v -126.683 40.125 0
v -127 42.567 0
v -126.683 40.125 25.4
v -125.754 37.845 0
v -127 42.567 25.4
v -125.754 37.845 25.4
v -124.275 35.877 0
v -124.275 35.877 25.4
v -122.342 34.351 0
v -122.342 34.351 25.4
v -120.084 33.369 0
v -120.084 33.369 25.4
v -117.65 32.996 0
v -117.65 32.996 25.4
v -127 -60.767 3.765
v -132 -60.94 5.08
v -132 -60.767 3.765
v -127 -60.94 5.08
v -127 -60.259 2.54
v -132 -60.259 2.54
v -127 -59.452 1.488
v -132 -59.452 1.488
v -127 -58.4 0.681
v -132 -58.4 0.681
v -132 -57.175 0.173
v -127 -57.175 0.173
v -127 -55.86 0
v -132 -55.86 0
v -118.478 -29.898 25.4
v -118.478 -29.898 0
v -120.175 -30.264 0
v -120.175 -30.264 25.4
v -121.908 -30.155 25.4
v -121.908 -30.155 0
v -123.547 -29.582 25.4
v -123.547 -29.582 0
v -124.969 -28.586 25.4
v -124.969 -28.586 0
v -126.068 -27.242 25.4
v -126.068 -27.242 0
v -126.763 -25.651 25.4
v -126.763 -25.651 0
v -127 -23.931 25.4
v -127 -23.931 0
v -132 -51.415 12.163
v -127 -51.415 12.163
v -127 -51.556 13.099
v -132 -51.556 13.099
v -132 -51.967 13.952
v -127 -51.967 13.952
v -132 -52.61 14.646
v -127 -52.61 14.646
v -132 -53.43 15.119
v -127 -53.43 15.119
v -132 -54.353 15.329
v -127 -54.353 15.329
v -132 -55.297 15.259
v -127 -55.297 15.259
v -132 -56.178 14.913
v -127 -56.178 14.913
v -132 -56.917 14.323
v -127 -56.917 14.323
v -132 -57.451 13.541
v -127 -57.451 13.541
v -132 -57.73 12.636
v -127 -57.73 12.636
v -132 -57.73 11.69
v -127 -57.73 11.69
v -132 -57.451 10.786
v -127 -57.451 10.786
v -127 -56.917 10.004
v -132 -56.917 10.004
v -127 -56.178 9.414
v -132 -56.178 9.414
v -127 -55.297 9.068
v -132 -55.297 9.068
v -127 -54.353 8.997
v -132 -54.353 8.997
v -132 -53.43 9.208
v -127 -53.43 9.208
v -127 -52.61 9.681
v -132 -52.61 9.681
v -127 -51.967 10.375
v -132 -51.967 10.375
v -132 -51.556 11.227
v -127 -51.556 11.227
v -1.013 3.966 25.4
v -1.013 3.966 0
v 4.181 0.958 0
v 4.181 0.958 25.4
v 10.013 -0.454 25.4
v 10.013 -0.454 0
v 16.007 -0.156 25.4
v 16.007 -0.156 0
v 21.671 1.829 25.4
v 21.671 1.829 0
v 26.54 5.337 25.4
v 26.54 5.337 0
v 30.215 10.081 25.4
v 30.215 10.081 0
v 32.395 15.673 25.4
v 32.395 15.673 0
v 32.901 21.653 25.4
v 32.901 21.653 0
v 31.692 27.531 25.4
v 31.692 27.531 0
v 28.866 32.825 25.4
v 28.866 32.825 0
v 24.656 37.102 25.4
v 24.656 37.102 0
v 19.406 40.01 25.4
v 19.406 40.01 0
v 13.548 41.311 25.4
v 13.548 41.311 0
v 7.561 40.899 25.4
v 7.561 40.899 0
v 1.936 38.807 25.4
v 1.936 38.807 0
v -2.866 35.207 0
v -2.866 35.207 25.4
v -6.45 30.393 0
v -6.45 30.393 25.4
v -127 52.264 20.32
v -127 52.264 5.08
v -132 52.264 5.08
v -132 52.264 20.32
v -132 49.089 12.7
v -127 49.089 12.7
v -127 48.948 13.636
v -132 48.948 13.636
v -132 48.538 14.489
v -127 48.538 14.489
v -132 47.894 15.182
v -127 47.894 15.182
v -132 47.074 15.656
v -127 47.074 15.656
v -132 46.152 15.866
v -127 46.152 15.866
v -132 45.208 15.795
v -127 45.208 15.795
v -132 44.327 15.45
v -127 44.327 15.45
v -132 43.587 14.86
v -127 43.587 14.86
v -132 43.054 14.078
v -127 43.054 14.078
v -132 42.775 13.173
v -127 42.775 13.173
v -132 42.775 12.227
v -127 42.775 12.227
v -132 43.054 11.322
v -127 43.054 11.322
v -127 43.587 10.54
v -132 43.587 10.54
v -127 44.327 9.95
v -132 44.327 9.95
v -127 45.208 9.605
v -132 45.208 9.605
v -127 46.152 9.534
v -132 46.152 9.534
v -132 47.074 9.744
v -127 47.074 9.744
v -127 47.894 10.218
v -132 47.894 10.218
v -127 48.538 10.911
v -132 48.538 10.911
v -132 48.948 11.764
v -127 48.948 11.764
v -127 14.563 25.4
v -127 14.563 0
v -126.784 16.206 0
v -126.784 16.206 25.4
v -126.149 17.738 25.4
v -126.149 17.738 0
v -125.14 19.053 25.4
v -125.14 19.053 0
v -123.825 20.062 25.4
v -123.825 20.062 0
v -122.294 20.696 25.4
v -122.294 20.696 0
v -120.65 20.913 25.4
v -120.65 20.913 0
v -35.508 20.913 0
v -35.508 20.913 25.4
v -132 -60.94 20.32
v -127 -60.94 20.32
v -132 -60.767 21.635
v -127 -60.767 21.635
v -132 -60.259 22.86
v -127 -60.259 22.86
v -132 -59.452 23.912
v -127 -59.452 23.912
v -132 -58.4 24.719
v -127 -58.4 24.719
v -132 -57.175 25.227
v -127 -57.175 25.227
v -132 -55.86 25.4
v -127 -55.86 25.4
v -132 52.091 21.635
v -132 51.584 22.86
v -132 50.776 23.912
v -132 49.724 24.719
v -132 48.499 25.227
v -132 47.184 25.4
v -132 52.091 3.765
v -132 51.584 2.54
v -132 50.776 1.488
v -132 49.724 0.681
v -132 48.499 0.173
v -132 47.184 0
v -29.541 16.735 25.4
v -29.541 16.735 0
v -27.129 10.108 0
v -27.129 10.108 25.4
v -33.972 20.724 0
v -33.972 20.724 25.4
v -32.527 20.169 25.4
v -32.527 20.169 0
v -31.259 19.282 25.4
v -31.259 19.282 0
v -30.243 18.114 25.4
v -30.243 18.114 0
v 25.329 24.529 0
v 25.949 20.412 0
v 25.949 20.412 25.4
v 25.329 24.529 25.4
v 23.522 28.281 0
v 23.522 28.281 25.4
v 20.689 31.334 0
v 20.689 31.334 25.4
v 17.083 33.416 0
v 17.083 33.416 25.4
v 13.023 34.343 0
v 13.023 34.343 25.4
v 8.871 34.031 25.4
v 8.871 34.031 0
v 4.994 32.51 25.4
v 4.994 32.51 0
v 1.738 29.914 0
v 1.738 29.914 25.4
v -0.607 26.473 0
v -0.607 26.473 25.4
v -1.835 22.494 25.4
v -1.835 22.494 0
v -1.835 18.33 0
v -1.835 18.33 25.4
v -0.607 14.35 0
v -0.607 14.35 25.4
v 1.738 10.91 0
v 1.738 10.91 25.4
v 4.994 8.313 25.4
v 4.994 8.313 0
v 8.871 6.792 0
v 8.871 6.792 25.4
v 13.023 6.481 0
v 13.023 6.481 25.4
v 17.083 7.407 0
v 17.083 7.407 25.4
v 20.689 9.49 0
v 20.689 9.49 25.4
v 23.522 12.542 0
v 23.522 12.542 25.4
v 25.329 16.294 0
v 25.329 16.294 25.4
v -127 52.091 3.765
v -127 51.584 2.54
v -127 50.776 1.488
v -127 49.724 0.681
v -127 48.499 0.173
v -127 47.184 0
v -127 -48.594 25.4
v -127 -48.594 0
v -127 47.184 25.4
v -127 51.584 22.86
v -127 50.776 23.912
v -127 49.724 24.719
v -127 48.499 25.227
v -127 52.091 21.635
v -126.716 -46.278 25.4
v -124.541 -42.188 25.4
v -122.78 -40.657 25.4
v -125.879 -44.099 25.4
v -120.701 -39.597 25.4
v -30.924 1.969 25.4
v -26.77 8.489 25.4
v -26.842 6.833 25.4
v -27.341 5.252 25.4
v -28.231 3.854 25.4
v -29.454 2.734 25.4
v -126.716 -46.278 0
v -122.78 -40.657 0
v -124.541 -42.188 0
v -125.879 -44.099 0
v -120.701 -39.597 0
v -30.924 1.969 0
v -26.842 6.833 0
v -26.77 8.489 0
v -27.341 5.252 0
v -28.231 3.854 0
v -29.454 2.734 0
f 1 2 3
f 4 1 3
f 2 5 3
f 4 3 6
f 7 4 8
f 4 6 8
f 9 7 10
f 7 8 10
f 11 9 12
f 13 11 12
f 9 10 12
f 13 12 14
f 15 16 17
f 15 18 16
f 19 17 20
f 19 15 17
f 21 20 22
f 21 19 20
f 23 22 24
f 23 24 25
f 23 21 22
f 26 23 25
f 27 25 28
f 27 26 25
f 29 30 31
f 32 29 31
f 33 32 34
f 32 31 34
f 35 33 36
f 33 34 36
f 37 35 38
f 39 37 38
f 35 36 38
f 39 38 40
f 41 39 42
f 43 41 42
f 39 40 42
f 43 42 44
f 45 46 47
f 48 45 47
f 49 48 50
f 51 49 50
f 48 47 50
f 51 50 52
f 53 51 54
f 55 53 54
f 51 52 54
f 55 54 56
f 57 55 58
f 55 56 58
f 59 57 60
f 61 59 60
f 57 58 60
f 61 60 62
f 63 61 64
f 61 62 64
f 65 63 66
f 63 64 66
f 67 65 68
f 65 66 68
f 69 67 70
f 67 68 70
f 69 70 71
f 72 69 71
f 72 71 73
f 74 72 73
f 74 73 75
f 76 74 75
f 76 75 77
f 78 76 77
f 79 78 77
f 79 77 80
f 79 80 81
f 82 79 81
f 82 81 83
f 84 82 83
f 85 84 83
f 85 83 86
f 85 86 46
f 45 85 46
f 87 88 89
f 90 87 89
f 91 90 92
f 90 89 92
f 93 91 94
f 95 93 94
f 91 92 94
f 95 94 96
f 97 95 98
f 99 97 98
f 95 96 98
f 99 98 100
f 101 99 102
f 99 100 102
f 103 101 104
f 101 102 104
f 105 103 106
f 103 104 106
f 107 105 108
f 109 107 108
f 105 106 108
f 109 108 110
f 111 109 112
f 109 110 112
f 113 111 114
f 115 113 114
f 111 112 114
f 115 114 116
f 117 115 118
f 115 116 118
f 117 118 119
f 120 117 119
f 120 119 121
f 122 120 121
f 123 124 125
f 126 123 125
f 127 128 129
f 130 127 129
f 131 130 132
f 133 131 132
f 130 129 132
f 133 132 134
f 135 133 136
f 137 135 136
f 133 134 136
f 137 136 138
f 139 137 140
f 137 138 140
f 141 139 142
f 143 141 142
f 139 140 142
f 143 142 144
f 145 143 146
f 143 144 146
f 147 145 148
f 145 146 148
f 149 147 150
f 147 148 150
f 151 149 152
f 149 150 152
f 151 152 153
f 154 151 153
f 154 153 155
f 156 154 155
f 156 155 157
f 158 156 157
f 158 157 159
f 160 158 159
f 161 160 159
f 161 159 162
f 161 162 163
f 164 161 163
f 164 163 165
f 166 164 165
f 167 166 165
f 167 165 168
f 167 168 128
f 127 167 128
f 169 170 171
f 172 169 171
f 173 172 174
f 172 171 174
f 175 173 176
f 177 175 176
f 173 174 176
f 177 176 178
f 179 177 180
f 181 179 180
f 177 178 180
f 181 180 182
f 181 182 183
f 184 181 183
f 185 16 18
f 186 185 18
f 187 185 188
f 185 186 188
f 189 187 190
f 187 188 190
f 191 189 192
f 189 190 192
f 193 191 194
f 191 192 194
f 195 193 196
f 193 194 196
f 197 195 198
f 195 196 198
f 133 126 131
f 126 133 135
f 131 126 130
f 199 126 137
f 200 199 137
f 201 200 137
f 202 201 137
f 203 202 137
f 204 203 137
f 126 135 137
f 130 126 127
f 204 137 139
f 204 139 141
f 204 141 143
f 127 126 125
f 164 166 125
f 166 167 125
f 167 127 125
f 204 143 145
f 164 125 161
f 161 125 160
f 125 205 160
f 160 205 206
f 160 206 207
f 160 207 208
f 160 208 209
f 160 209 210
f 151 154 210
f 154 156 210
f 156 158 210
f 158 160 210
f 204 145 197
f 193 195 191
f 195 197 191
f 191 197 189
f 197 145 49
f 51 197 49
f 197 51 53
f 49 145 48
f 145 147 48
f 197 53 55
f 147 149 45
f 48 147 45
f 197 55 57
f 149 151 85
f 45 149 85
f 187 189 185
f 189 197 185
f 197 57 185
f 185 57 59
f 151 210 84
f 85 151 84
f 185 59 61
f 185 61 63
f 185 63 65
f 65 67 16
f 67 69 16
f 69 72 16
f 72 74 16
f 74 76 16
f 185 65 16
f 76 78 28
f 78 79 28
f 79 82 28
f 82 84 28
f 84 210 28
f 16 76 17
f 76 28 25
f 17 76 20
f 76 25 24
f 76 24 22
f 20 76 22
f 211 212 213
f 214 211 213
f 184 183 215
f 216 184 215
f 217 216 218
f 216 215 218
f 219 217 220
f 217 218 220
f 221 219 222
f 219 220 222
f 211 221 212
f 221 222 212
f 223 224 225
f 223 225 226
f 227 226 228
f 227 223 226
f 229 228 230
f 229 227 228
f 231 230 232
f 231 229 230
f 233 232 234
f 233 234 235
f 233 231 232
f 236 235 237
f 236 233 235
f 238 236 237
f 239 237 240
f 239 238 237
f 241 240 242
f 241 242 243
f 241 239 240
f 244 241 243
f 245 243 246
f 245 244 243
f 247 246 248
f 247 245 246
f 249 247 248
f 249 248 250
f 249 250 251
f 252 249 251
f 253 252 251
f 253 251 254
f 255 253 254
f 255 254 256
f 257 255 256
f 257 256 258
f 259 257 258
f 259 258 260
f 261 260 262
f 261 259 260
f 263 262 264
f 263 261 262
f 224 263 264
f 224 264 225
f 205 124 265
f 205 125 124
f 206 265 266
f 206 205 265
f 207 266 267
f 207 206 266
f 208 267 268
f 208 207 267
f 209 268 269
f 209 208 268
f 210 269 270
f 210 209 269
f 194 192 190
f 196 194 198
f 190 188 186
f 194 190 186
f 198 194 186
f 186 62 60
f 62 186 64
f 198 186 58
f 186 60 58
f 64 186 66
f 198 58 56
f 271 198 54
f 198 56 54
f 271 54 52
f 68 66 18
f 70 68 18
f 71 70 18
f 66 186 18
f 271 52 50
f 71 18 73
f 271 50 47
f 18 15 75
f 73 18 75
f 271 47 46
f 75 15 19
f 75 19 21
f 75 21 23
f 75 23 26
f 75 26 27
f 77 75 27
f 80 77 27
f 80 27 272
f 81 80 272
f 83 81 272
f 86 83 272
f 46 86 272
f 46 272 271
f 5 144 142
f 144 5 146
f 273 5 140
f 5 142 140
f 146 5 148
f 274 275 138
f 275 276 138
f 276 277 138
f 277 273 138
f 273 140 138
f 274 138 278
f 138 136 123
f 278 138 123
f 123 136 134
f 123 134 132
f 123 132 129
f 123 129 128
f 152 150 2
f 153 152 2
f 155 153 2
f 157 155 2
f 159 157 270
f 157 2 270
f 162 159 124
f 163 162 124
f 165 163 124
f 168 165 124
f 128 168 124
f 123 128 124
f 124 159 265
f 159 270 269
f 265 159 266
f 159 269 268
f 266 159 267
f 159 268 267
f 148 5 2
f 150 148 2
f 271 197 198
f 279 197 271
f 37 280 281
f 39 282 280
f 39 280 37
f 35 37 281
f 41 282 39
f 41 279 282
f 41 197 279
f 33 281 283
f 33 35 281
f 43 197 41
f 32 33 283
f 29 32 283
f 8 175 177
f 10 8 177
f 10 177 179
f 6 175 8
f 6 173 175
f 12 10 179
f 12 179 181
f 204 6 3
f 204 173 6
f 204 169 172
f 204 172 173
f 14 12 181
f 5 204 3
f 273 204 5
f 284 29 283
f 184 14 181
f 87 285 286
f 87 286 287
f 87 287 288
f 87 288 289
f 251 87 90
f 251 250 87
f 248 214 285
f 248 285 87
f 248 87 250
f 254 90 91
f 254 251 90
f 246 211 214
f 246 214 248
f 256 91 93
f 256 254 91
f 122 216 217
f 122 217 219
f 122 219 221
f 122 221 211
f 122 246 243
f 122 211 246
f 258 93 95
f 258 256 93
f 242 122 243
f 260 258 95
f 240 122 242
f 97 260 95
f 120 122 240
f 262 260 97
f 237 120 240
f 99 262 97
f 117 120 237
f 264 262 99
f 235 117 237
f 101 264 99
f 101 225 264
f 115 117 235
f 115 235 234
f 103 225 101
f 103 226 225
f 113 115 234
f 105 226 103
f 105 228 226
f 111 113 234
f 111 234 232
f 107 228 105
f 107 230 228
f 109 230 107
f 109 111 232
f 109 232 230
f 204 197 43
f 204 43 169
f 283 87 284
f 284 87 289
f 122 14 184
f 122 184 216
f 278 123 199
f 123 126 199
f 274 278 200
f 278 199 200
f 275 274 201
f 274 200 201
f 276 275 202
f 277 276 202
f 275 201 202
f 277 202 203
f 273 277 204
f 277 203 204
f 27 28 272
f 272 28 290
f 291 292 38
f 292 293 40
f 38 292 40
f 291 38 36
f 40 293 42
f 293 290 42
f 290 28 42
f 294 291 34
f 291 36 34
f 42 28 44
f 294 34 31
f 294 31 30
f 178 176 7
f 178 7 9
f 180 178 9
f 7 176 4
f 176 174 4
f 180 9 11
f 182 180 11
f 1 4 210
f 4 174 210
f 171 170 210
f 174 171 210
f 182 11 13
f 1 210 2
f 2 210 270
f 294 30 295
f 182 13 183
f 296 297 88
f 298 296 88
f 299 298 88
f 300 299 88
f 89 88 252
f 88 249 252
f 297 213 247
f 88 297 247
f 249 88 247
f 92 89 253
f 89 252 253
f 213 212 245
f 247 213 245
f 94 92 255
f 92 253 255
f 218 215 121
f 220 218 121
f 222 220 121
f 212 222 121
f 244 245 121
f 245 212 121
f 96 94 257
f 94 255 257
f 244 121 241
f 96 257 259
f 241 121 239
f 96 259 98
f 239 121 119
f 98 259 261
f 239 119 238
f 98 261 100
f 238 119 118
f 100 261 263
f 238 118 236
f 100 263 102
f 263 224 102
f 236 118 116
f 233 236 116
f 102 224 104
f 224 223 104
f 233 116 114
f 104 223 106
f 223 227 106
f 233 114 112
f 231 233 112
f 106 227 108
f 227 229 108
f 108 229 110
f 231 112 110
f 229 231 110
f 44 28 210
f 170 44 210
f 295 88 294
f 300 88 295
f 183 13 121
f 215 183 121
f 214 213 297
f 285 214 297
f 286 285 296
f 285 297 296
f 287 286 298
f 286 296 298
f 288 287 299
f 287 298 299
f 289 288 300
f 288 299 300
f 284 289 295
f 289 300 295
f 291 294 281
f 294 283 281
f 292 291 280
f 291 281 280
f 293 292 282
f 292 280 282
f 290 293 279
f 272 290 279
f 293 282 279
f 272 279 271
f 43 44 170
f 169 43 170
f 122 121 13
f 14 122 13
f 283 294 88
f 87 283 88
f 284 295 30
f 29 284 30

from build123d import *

# Parameters (mm, degrees)
F0_R     = 13.97
F1_DEPTH = 25.4
F2_R     = 5.08
F3_R     = 3.175
F4_DEPTH = 5.001
F5_R     = 9.573934


with BuildPart() as f1:
    # F0 (on Top) → F1 (new body)
    with BuildSketch(Plane.XY):
        with BuildLine():
            Line((-127, 52.264305), (-132, 52.264305))
            Line((-132, 52.264305), (-132, -60.940004))
            Line((-132, -60.940004), (-127, -60.940004))
            Line((-127, -60.940004), (-127, -41.890004))
            Line((-127, -41.890004), (-1.012586, 3.965665))
            ThreePointArc((-1.012586, 3.965665), (32.5077, 24.635271), (-6.449811, 30.393267))
            Line((-6.449811, 30.393267), (-127, 33.214305))
            Line((-127, 33.214305), (-127, 52.264305))
        make_face()
        with BuildLine():
            Line((-127, -23.931264), (-127, 14.562711))
            ThreePointArc((-127, 14.562711), (-125.140128, 19.052839), (-120.65, 20.912711))
            Line((-120.65, 20.912711), (-35.507844, 20.912711))
            ThreePointArc((-35.507844, 20.912711), (-31.865634, 19.764326), (-29.540796, 16.734538))
            Line((-29.540796, 16.734538), (-27.128811, 10.107665))
            ThreePointArc((-27.128811, 10.107665), (-27.340805, 5.252211), (-30.924032, 1.968789))
            Line((-30.924032, 1.968789), (-118.478172, -29.898312))
            ThreePointArc((-118.478172, -29.898312), (-124.29221, -29.132879), (-127, -23.931264))
        make_face(mode=Mode.SUBTRACT)
        with Locations((11.979175, 20.411724)):
            Circle(F0_R, mode=Mode.SUBTRACT)
    extrude(amount=F1_DEPTH)

    # F2
    f2_edges = [f1.edges().sort_by_distance(p)[0] for p in [
        (-129.5, 52.264305, 25.4),
        (-129.5, 52.264305, 0),
        (-129.5, -60.940004, 0),
        (-129.5, -60.940004, 25.4),
    ]]
    fillet(f2_edges, radius=F2_R)

    # F3 (on face) → F4 (cut, through all)
    with BuildSketch(Plane.YZ.offset(-127)):
        with Locations((45.914305, 12.7)):
            Circle(F3_R)
        with Locations((-54.590004, 12.163277)):
            Circle(F3_R)
    extrude(amount=-F4_DEPTH, mode=Mode.SUBTRACT)

    # F5
    f5_edges = [f1.edges().sort_by_distance(p)[0] for p in [
        (-127, -41.890004, 12.7),
        (-127, 33.214305, 12.7),
    ]]
    fillet(f5_edges, radius=F5_R)


solid = f1.part
